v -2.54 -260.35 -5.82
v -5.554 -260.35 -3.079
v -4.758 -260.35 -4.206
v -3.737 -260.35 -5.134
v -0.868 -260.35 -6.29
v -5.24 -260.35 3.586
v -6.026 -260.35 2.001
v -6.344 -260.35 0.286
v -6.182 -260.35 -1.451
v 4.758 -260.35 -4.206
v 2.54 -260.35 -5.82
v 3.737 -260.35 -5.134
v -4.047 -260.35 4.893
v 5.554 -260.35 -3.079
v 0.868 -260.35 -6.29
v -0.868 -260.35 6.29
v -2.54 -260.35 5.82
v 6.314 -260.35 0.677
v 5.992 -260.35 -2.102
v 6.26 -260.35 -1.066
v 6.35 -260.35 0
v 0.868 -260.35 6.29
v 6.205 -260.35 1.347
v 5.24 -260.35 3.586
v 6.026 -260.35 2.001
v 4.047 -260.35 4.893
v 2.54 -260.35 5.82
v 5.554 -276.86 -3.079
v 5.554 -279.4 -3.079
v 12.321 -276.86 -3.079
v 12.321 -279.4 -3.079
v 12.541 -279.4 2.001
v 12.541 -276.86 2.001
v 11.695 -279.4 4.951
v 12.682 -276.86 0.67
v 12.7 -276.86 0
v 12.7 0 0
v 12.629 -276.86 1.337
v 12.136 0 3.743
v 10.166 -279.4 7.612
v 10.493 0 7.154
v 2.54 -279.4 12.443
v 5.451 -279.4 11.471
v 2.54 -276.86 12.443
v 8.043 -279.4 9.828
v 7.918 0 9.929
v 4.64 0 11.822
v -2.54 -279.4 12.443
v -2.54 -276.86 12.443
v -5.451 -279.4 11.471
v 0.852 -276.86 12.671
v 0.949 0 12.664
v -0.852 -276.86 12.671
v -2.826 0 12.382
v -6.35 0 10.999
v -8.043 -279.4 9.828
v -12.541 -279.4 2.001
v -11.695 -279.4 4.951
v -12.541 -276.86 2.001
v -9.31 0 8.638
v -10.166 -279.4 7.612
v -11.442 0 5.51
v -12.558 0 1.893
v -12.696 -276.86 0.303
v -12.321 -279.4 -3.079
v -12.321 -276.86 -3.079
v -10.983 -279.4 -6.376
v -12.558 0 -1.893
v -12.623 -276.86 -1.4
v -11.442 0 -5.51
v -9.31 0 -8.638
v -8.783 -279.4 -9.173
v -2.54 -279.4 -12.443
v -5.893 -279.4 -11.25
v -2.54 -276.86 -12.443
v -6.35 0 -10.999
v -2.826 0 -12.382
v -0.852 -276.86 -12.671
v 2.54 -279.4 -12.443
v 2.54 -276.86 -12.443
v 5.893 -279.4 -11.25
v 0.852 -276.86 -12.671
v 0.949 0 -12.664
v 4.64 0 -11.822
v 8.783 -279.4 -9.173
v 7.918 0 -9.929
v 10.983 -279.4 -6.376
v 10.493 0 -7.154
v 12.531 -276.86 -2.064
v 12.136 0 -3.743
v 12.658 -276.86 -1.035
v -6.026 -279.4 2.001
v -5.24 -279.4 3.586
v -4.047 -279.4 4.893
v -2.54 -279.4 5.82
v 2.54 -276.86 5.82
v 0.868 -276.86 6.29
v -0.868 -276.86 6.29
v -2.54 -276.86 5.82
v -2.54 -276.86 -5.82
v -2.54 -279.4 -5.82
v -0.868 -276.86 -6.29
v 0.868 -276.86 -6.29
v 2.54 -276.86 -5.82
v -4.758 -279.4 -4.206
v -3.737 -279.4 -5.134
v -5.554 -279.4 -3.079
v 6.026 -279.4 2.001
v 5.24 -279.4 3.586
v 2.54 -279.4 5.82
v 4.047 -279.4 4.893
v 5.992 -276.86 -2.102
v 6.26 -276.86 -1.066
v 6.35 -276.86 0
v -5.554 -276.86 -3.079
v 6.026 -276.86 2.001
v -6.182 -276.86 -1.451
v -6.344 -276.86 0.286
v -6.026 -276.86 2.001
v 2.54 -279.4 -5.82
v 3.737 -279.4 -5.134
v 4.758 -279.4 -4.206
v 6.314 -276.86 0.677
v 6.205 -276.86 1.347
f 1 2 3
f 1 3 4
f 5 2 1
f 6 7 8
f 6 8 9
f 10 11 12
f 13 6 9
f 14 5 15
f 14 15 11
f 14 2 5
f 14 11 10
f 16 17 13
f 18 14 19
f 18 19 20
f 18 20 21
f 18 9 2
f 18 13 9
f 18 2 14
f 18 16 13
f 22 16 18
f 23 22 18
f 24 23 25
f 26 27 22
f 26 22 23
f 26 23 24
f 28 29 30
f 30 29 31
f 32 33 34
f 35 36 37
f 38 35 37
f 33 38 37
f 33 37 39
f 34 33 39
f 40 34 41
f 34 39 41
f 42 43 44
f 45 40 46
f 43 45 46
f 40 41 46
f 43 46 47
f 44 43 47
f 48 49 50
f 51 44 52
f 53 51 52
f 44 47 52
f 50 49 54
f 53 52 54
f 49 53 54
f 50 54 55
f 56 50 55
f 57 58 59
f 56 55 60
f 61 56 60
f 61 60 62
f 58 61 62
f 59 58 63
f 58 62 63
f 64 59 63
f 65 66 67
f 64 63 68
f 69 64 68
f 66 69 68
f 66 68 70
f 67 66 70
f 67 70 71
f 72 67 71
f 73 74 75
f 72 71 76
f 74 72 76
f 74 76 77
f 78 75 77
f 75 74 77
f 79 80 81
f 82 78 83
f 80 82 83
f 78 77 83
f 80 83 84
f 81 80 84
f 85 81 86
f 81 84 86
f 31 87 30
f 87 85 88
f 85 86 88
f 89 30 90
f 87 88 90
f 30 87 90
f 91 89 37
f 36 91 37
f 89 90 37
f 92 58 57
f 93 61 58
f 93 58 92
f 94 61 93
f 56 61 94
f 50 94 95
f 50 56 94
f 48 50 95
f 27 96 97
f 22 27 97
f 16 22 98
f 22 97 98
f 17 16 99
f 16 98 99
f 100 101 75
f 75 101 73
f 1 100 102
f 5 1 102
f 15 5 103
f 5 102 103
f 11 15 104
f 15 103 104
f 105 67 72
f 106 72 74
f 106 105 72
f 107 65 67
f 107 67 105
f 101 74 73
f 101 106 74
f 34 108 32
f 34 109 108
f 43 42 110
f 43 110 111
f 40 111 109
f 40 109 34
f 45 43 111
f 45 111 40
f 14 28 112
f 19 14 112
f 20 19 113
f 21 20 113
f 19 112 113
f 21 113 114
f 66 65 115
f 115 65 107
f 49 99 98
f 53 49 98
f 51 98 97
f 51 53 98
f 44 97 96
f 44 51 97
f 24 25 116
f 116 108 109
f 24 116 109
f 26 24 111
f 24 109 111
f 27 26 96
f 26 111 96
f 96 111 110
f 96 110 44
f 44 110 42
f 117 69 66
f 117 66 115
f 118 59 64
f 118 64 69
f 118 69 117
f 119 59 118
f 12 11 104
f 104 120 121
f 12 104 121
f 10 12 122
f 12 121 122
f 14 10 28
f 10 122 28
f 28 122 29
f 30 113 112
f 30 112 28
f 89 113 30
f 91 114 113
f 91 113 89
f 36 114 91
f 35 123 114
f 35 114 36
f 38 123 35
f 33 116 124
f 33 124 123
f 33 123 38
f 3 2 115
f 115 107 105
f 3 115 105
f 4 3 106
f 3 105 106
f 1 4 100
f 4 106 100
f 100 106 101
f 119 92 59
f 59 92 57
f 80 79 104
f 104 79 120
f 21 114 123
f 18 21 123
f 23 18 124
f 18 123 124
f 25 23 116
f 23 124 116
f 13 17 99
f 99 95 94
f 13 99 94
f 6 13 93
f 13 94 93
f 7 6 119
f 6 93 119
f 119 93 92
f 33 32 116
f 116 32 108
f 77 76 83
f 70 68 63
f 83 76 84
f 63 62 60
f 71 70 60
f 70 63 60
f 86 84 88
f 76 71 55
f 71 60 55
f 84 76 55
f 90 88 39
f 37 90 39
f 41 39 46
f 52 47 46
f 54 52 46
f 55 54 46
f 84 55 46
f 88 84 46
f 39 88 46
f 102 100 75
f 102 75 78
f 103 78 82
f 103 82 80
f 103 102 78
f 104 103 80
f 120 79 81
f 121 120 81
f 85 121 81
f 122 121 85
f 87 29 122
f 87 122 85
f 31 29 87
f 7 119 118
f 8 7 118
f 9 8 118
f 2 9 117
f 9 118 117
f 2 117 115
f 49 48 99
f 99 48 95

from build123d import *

# Parameters (mm, degrees)
F0_R     = 12.7
F1_DEPTH = 279.4
F3_DEPTH = 2.54
F4_DEPTH = 19.05


with BuildPart() as f1:
    # F0 (on Front) → F1 (new body)
    with BuildSketch(Plane.XZ):
        Circle(F0_R)
    extrude(amount=F1_DEPTH)

    # F2 (on face) → F3 (cut)
    with BuildSketch(Plane.XZ.offset(279.4)):
        with BuildLine():
            ThreePointArc((-5.5537875001, -3.0786270322), (-6.3227011551, -0.5881752316), (-6.026359286, 2.0013729678))
            Line((-6.026359286, 2.0013729678), (-12.5413119826, 2.0013729678))
            ThreePointArc((-12.5413119826, 2.0013729678), (-12.6880955617, -0.549755415), (-12.3212034963, -3.0786270322))
            Line((-12.3212034963, -3.0786270322), (-5.5537875001, -3.0786270322))
        make_face()
        with BuildLine():
            ThreePointArc((-2.54, 5.8198711326), (0, 6.35), (2.54, 5.8198711326))
            Line((2.54, 5.8198711326), (2.54, 12.4434078933))
            ThreePointArc((2.54, 12.4434078933), (0, 12.7), (-2.54, 12.4434078933))
            Line((-2.54, 12.4434078933), (-2.54, 5.8198711326))
        make_face()
        with BuildLine():
            ThreePointArc((6.026359286, 2.0013729678), (6.2685676779, 1.0136859805), (6.35, 0))
            ThreePointArc((6.35, 0), (6.1477252145, -1.589960593), (5.5537875001, -3.0786270322))
            Line((5.5537875001, -3.0786270322), (12.3212034963, -3.0786270322))
            ThreePointArc((12.3212034963, -3.0786270322), (12.6049451487, -1.5509215966), (12.7, 0))
            ThreePointArc((12.7, 0), (12.660265838, 1.0038271319), (12.5413119826, 2.0013729678))
            Line((12.5413119826, 2.0013729678), (6.026359286, 2.0013729678))
        make_face()
        with BuildLine():
            Line((2.54, -12.4434078933), (2.54, -5.8198711326))
            ThreePointArc((2.54, -5.8198711326), (0, -6.35), (-2.54, -5.8198711326))
            Line((-2.54, -5.8198711326), (-2.54, -12.4434078933))
            ThreePointArc((-2.54, -12.4434078933), (0, -12.7), (2.54, -12.4434078933))
        make_face()
    extrude(amount=-F3_DEPTH, mode=Mode.SUBTRACT)

    # F2 (on face) → F4 (cut)
    with BuildSketch(Plane.XZ.offset(279.4)):
        with BuildLine():
            ThreePointArc((5.5537875001, -3.0786270322), (6.1477252145, -1.589960593), (6.35, 0))
            ThreePointArc((6.35, 0), (6.2685676779, 1.0136859805), (6.026359286, 2.0013729678))
            ThreePointArc((6.026359286, 2.0013729678), (4.689441322, 4.2815464598), (2.54, 5.8198711326))
            ThreePointArc((2.54, 5.8198711326), (0, 6.35), (-2.54, 5.8198711326))
            ThreePointArc((-2.54, 5.8198711326), (-4.689441322, 4.2815464598), (-6.026359286, 2.0013729678))
            ThreePointArc((-6.026359286, 2.0013729678), (-6.3227011551, -0.5881752316), (-5.5537875001, -3.0786270322))
            ThreePointArc((-5.5537875001, -3.0786270322), (-4.2726986588, -4.6975042492), (-2.54, -5.8198711326))
            ThreePointArc((-2.54, -5.8198711326), (0, -6.35), (2.54, -5.8198711326))
            ThreePointArc((2.54, -5.8198711326), (4.2726986588, -4.6975042492), (5.5537875001, -3.0786270322))
        make_face()
    extrude(amount=-F4_DEPTH, mode=Mode.SUBTRACT)


solid = f1.part
